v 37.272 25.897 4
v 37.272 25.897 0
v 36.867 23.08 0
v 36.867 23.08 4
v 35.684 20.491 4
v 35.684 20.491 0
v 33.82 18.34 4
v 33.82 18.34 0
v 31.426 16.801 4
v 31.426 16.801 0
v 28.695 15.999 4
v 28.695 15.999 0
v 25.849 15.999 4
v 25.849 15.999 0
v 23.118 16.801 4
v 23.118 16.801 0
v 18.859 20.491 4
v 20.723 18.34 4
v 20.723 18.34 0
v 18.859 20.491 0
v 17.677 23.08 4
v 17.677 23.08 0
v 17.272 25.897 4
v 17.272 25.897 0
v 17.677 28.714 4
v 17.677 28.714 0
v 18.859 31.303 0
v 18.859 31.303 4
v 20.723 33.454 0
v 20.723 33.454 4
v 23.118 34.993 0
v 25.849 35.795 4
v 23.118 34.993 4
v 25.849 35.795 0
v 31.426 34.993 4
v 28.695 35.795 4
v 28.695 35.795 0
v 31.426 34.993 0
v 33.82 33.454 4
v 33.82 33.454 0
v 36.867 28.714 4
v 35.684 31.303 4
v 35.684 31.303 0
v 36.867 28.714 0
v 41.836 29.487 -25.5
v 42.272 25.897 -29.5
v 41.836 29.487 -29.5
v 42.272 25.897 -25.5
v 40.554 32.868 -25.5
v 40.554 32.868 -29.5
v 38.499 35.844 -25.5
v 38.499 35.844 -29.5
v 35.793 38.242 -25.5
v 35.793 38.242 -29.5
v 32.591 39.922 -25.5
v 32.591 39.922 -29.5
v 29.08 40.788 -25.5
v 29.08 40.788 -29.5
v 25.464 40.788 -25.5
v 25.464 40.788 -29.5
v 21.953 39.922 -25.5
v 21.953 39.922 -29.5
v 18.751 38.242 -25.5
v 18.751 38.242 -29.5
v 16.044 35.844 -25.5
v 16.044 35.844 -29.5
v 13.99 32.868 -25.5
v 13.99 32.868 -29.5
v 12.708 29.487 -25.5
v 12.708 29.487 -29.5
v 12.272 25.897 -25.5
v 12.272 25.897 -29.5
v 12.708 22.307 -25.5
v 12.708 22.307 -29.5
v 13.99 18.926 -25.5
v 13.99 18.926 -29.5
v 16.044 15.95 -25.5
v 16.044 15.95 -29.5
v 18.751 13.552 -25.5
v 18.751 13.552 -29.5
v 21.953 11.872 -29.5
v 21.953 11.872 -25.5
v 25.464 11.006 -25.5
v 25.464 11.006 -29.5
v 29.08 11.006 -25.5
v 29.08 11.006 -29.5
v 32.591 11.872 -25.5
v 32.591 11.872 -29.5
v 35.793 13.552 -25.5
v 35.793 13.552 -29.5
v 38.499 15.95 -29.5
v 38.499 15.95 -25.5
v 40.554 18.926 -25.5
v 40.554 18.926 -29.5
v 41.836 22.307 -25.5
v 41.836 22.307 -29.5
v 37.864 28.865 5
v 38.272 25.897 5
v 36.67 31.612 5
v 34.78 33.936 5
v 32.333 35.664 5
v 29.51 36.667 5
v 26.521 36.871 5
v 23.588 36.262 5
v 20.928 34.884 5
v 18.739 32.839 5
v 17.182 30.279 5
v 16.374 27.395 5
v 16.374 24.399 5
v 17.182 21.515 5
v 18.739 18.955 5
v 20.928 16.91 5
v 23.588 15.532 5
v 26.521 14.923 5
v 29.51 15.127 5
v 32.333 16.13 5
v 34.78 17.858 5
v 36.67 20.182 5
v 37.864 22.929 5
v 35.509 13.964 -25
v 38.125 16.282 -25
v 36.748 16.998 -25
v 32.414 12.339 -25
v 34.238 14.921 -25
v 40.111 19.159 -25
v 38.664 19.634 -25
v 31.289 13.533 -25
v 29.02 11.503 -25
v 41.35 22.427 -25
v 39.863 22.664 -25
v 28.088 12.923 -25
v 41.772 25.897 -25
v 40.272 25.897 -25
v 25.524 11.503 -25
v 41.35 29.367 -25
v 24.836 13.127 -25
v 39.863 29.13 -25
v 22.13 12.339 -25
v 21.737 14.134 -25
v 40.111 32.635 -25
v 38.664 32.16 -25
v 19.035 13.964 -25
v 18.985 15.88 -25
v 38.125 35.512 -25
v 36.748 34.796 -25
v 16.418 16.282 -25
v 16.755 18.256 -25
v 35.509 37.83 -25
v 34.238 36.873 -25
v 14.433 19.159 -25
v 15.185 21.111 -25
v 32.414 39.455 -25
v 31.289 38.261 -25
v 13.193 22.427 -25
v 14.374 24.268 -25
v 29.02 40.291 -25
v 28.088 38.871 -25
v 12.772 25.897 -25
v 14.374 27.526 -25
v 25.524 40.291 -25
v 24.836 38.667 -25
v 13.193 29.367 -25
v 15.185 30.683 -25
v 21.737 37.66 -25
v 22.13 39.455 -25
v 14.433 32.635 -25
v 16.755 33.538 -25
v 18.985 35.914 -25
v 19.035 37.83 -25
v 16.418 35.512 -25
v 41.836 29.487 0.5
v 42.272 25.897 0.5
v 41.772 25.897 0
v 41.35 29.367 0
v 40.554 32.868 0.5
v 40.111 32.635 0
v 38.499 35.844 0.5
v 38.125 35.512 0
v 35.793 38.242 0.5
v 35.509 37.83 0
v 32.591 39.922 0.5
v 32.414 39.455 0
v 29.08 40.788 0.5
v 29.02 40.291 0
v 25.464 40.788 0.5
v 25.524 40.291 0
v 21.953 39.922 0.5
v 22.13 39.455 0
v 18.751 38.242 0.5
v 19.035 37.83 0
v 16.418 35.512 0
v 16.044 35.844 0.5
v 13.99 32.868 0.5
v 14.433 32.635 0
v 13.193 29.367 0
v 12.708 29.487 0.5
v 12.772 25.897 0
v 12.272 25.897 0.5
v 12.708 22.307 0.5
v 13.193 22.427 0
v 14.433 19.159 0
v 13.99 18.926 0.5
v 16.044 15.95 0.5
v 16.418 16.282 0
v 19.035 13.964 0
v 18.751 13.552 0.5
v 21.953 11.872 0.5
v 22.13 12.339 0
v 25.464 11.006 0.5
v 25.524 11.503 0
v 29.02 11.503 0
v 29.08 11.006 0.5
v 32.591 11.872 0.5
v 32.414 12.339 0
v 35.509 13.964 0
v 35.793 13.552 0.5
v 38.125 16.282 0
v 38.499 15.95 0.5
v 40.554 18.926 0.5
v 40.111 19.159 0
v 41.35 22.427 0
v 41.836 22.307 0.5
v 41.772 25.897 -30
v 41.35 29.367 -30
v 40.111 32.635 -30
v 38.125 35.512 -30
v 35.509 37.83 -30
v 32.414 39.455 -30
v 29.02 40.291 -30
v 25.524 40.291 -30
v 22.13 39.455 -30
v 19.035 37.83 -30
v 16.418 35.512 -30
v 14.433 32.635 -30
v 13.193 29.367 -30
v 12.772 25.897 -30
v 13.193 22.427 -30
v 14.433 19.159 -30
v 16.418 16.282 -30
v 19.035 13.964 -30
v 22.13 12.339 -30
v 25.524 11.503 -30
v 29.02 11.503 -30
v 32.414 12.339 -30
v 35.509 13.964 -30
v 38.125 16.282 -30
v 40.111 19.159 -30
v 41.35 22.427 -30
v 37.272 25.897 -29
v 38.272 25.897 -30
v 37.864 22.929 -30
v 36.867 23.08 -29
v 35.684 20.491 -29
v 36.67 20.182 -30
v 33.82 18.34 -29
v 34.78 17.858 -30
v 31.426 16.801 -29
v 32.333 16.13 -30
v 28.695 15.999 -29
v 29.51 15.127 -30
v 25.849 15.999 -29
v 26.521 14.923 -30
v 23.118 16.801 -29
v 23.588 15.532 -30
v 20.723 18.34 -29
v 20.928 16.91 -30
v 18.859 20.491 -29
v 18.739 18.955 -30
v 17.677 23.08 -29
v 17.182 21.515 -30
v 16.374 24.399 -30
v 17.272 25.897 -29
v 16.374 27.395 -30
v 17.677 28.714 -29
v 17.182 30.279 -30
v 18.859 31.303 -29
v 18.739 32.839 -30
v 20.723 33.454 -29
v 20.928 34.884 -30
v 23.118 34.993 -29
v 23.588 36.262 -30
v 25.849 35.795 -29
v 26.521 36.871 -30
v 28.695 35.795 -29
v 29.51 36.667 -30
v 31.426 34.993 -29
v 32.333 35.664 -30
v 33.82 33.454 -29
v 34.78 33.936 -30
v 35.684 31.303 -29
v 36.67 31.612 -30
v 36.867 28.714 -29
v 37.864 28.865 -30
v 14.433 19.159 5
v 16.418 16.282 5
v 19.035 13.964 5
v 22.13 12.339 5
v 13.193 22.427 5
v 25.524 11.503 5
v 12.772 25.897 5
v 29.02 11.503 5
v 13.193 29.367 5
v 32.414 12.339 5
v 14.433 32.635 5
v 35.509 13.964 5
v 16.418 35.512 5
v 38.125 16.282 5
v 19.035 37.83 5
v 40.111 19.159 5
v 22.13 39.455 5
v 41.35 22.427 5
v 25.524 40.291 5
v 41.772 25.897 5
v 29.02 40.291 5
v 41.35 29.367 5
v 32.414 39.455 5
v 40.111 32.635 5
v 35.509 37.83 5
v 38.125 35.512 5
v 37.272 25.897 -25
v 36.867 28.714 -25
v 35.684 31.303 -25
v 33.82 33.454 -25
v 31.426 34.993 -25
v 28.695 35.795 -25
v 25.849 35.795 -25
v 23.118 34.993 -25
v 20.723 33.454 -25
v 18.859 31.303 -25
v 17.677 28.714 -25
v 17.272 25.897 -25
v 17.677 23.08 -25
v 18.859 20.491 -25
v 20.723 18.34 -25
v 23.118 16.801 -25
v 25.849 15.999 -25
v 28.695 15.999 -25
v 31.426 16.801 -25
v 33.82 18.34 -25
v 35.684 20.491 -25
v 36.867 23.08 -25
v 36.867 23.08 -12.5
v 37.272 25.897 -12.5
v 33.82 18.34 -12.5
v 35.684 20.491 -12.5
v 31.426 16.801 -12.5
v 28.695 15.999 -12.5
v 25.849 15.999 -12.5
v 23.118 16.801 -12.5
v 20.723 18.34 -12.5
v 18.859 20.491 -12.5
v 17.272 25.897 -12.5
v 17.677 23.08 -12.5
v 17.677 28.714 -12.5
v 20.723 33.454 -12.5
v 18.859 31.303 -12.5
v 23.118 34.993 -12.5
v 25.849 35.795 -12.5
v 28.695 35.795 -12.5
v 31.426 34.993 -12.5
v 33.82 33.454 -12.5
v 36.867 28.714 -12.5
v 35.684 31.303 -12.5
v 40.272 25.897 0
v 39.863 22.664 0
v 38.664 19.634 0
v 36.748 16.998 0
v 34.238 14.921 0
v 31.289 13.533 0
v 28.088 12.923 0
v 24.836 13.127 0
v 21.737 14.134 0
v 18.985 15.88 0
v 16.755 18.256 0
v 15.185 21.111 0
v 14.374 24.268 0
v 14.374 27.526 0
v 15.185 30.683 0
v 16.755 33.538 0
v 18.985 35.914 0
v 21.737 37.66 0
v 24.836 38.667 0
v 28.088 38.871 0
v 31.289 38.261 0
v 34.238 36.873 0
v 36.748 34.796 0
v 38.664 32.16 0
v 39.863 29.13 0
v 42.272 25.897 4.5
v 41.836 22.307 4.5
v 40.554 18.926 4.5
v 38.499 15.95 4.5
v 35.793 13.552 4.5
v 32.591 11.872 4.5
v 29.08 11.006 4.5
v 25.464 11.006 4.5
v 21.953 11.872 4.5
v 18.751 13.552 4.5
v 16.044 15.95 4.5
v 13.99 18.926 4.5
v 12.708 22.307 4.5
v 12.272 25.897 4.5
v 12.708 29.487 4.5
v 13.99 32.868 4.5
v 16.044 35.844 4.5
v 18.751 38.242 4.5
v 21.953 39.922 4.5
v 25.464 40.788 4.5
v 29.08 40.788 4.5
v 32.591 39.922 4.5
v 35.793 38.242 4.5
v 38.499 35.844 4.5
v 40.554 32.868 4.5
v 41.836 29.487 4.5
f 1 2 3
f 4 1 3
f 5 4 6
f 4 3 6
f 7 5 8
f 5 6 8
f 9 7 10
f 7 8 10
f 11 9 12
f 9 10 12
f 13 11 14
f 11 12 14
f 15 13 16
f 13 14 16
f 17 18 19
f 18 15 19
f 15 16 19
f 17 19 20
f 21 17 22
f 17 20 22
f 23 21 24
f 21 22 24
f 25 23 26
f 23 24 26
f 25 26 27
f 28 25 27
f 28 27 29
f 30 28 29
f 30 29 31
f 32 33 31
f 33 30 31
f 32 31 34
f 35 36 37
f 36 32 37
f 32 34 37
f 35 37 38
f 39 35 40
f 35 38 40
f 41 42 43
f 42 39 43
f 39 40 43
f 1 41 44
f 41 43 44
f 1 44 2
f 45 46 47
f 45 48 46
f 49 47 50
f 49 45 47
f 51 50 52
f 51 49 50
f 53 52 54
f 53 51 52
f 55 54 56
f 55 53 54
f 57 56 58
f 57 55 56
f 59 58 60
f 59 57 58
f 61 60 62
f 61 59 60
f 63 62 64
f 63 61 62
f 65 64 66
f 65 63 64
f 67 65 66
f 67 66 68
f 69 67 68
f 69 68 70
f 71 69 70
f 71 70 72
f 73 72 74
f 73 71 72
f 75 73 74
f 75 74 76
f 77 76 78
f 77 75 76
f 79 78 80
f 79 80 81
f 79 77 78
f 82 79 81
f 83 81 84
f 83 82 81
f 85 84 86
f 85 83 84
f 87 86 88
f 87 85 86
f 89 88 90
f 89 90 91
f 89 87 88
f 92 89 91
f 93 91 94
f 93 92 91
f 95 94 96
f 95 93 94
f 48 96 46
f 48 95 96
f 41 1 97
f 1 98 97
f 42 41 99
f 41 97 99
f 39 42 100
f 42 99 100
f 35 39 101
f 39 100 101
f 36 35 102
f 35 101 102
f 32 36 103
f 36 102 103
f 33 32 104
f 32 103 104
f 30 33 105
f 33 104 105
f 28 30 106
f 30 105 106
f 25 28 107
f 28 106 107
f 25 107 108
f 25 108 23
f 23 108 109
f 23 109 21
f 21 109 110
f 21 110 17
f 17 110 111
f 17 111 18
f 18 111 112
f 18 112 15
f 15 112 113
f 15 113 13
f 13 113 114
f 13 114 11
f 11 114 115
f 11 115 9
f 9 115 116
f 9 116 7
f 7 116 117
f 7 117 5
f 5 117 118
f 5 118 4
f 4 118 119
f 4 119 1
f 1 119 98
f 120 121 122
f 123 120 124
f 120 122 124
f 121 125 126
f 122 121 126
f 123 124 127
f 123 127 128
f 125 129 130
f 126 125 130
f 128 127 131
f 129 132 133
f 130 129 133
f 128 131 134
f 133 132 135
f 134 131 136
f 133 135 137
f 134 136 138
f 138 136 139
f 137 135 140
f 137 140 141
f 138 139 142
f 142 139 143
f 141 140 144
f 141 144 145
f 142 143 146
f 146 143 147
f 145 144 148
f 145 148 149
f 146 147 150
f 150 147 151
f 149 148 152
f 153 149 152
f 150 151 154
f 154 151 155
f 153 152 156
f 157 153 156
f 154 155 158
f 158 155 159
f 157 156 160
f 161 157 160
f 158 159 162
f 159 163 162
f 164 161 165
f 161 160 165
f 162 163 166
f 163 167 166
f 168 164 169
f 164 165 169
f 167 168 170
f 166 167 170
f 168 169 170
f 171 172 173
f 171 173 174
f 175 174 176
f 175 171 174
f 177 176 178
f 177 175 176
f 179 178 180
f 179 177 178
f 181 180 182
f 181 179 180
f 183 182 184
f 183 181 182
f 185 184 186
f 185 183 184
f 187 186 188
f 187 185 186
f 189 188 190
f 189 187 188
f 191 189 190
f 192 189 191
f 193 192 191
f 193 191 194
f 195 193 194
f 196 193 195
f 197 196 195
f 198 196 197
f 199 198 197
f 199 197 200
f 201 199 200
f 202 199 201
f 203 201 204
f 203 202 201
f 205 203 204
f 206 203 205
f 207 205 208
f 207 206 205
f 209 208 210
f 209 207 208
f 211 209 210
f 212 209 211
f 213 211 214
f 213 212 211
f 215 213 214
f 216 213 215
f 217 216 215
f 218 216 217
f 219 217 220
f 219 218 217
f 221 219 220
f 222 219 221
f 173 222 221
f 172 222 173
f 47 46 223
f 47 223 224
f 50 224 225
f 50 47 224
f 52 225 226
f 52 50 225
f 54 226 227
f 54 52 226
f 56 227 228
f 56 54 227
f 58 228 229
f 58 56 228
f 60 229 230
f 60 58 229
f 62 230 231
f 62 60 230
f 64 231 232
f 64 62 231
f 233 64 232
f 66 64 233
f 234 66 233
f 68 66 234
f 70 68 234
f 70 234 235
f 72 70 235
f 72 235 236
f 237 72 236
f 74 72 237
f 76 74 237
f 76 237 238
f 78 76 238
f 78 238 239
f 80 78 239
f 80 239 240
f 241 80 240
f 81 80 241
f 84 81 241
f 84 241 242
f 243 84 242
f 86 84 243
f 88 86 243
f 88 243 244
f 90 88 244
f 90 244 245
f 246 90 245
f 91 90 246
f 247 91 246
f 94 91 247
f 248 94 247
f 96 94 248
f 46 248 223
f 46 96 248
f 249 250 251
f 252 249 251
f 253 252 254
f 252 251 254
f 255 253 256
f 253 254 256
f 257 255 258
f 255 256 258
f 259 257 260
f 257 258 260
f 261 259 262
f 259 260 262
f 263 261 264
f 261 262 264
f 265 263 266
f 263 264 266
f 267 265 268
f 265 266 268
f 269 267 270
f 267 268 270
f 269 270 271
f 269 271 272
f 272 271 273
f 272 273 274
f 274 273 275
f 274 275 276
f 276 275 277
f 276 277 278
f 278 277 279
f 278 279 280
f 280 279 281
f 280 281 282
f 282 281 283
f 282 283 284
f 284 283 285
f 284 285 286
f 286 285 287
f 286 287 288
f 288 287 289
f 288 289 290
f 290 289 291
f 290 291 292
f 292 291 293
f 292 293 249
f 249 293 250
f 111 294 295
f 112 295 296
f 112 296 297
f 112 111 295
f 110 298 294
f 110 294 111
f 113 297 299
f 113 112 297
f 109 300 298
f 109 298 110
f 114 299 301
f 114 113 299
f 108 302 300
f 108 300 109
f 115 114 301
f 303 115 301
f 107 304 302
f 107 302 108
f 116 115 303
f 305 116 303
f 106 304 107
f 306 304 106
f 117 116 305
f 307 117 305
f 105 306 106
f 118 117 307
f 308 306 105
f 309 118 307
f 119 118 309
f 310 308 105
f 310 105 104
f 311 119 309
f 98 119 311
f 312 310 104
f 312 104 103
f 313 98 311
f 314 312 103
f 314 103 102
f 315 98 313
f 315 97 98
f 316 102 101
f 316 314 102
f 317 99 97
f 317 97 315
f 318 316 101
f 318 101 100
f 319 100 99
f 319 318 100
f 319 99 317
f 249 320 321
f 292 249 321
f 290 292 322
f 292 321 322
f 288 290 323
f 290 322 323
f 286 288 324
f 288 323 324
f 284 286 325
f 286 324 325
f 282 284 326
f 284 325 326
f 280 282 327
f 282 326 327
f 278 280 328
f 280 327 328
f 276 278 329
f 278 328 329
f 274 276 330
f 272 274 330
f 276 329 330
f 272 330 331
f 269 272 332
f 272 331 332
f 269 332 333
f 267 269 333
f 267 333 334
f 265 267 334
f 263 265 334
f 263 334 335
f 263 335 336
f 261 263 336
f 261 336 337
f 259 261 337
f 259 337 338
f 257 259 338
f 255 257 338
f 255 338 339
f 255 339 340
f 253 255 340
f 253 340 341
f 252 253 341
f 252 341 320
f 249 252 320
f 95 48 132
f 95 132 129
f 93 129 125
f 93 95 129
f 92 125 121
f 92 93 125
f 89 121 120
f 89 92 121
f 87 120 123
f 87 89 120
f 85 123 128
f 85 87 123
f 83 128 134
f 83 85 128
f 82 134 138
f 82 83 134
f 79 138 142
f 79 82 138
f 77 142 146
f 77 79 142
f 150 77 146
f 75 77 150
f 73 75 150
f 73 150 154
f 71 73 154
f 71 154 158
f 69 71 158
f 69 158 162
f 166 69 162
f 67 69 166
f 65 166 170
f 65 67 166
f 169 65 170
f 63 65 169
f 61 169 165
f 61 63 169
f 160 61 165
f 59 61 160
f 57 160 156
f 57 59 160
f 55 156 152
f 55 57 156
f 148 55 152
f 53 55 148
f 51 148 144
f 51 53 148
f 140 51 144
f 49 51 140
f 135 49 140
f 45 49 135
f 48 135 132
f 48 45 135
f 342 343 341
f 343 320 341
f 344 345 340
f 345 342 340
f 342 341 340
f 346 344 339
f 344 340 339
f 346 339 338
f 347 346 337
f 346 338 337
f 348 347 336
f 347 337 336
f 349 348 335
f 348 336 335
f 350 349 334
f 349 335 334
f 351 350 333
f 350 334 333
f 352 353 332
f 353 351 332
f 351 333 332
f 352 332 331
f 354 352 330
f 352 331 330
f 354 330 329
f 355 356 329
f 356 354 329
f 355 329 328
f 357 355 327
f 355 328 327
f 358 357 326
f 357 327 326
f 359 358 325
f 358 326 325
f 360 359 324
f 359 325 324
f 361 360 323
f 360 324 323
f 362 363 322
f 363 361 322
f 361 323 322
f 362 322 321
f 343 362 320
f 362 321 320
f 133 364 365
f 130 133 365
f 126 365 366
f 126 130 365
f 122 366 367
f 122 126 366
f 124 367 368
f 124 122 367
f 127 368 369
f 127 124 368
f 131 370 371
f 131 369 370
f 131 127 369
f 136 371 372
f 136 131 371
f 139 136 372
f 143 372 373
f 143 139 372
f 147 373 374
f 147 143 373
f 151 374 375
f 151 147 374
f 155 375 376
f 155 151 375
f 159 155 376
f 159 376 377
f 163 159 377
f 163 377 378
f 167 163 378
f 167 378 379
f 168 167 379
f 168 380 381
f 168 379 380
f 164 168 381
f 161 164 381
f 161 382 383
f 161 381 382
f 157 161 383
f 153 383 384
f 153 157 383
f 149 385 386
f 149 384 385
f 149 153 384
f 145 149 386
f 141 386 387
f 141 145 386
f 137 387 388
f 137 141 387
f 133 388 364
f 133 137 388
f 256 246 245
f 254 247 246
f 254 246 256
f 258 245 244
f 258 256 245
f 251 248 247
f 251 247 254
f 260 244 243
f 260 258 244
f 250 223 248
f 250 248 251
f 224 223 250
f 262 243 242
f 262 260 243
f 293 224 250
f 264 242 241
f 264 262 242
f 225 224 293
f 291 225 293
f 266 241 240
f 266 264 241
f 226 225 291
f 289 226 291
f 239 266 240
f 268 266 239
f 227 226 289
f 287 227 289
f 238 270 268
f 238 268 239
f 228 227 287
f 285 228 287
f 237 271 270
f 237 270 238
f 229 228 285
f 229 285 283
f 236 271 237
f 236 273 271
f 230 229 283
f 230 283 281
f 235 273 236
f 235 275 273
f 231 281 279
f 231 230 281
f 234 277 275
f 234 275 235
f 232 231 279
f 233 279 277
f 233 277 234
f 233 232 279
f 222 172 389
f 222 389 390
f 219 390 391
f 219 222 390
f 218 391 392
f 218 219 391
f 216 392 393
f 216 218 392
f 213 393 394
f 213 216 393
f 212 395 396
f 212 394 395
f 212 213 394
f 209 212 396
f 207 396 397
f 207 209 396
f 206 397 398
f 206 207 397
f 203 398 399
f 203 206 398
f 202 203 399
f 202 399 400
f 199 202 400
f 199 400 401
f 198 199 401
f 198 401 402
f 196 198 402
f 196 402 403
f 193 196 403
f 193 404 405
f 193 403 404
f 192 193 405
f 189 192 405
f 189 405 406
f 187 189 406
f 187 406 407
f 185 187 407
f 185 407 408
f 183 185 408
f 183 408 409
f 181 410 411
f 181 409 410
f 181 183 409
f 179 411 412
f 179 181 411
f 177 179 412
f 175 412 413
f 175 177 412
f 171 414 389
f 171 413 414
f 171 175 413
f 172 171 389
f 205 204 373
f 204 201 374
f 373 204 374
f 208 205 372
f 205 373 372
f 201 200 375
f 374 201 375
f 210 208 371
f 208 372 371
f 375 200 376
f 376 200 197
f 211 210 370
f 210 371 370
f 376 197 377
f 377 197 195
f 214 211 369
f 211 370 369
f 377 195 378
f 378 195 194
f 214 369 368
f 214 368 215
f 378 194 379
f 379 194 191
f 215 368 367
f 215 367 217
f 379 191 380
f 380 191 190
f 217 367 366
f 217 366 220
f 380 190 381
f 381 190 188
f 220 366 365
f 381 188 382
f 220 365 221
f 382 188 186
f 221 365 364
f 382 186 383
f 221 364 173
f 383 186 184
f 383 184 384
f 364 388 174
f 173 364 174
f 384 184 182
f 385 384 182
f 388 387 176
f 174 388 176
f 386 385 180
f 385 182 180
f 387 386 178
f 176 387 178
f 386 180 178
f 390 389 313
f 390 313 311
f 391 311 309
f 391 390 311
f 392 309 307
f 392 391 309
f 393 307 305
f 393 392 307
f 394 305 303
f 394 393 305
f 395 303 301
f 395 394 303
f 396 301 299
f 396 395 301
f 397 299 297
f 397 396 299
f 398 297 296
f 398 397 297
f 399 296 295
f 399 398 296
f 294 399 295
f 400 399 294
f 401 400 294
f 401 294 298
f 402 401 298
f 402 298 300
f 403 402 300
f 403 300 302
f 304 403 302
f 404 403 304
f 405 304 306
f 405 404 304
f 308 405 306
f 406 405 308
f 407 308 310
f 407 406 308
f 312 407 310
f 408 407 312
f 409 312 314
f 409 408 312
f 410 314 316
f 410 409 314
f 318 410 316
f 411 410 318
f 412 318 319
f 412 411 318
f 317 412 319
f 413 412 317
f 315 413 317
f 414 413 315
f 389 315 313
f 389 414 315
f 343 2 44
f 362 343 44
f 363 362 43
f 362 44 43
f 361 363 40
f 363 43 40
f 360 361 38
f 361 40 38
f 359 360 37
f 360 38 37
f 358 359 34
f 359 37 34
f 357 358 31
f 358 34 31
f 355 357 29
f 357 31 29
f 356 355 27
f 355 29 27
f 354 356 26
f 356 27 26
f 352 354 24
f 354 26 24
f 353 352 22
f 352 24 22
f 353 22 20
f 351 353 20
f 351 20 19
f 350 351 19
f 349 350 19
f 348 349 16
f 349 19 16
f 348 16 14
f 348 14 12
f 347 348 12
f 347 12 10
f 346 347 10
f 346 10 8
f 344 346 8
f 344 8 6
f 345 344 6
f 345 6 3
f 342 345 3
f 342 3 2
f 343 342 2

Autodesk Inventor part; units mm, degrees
ref_plane "YZ Plane" through (0, 0, 0) normal (1, 0, 0) x (0, 1, 0)
ref_plane "XZ Plane" through (0, 0, 0) normal (0, 1, 0) x (-1, 0, 0)
ref_plane "XY Plane" through (0, 0, 0) normal (0, 0, 1) x (1, 0, 0)
sketch "Sketch1" plane through (0, 0, 0) normal (0, 0, 1) x (1, 0, 0)
  circle A0 centre (27.2718, 25.897) radius 13 projected
  circle A1 centre (27.2718, 25.897) radius 10
  point P0 (0, 0)
  dimension "d0" = 20
extrude "Extrusion1" add sketch "Sketch1" against normal blind 12.5
sketch "Sketch2" plane through (27.2718, 25.897, 0) normal (0, 0, 1) x (1, 0, 0)
  circle A0 centre (0, 0) radius 15
  circle A1 centre (0, 0) radius 10 projected
  point P0 (-27.2718, -25.897)
  dimension "d4" = 30
extrude "Extrusion2" add sketch "Sketch2" along normal blind 5
mirror "Mirror1" about plane through (27.2718, 25.897, -12.5) normal (0, 0, -1) of "Extrusion1", "Extrusion2"
chamfer "Chamfer1" distance 0.5 angle 45 4 edges at (12.2718, 25.897, -30) (12.2718, 25.897, 5) (12.2718, 25.897, 0) (12.2718, 25.897, -25)
chamfer "Chamfer2" distance 1 angle 45 2 edges at (17.2718, 25.897, 5) (17.2718, 25.897, -30)
properties part number "Holkki" material "Polyethylene, High Density"
